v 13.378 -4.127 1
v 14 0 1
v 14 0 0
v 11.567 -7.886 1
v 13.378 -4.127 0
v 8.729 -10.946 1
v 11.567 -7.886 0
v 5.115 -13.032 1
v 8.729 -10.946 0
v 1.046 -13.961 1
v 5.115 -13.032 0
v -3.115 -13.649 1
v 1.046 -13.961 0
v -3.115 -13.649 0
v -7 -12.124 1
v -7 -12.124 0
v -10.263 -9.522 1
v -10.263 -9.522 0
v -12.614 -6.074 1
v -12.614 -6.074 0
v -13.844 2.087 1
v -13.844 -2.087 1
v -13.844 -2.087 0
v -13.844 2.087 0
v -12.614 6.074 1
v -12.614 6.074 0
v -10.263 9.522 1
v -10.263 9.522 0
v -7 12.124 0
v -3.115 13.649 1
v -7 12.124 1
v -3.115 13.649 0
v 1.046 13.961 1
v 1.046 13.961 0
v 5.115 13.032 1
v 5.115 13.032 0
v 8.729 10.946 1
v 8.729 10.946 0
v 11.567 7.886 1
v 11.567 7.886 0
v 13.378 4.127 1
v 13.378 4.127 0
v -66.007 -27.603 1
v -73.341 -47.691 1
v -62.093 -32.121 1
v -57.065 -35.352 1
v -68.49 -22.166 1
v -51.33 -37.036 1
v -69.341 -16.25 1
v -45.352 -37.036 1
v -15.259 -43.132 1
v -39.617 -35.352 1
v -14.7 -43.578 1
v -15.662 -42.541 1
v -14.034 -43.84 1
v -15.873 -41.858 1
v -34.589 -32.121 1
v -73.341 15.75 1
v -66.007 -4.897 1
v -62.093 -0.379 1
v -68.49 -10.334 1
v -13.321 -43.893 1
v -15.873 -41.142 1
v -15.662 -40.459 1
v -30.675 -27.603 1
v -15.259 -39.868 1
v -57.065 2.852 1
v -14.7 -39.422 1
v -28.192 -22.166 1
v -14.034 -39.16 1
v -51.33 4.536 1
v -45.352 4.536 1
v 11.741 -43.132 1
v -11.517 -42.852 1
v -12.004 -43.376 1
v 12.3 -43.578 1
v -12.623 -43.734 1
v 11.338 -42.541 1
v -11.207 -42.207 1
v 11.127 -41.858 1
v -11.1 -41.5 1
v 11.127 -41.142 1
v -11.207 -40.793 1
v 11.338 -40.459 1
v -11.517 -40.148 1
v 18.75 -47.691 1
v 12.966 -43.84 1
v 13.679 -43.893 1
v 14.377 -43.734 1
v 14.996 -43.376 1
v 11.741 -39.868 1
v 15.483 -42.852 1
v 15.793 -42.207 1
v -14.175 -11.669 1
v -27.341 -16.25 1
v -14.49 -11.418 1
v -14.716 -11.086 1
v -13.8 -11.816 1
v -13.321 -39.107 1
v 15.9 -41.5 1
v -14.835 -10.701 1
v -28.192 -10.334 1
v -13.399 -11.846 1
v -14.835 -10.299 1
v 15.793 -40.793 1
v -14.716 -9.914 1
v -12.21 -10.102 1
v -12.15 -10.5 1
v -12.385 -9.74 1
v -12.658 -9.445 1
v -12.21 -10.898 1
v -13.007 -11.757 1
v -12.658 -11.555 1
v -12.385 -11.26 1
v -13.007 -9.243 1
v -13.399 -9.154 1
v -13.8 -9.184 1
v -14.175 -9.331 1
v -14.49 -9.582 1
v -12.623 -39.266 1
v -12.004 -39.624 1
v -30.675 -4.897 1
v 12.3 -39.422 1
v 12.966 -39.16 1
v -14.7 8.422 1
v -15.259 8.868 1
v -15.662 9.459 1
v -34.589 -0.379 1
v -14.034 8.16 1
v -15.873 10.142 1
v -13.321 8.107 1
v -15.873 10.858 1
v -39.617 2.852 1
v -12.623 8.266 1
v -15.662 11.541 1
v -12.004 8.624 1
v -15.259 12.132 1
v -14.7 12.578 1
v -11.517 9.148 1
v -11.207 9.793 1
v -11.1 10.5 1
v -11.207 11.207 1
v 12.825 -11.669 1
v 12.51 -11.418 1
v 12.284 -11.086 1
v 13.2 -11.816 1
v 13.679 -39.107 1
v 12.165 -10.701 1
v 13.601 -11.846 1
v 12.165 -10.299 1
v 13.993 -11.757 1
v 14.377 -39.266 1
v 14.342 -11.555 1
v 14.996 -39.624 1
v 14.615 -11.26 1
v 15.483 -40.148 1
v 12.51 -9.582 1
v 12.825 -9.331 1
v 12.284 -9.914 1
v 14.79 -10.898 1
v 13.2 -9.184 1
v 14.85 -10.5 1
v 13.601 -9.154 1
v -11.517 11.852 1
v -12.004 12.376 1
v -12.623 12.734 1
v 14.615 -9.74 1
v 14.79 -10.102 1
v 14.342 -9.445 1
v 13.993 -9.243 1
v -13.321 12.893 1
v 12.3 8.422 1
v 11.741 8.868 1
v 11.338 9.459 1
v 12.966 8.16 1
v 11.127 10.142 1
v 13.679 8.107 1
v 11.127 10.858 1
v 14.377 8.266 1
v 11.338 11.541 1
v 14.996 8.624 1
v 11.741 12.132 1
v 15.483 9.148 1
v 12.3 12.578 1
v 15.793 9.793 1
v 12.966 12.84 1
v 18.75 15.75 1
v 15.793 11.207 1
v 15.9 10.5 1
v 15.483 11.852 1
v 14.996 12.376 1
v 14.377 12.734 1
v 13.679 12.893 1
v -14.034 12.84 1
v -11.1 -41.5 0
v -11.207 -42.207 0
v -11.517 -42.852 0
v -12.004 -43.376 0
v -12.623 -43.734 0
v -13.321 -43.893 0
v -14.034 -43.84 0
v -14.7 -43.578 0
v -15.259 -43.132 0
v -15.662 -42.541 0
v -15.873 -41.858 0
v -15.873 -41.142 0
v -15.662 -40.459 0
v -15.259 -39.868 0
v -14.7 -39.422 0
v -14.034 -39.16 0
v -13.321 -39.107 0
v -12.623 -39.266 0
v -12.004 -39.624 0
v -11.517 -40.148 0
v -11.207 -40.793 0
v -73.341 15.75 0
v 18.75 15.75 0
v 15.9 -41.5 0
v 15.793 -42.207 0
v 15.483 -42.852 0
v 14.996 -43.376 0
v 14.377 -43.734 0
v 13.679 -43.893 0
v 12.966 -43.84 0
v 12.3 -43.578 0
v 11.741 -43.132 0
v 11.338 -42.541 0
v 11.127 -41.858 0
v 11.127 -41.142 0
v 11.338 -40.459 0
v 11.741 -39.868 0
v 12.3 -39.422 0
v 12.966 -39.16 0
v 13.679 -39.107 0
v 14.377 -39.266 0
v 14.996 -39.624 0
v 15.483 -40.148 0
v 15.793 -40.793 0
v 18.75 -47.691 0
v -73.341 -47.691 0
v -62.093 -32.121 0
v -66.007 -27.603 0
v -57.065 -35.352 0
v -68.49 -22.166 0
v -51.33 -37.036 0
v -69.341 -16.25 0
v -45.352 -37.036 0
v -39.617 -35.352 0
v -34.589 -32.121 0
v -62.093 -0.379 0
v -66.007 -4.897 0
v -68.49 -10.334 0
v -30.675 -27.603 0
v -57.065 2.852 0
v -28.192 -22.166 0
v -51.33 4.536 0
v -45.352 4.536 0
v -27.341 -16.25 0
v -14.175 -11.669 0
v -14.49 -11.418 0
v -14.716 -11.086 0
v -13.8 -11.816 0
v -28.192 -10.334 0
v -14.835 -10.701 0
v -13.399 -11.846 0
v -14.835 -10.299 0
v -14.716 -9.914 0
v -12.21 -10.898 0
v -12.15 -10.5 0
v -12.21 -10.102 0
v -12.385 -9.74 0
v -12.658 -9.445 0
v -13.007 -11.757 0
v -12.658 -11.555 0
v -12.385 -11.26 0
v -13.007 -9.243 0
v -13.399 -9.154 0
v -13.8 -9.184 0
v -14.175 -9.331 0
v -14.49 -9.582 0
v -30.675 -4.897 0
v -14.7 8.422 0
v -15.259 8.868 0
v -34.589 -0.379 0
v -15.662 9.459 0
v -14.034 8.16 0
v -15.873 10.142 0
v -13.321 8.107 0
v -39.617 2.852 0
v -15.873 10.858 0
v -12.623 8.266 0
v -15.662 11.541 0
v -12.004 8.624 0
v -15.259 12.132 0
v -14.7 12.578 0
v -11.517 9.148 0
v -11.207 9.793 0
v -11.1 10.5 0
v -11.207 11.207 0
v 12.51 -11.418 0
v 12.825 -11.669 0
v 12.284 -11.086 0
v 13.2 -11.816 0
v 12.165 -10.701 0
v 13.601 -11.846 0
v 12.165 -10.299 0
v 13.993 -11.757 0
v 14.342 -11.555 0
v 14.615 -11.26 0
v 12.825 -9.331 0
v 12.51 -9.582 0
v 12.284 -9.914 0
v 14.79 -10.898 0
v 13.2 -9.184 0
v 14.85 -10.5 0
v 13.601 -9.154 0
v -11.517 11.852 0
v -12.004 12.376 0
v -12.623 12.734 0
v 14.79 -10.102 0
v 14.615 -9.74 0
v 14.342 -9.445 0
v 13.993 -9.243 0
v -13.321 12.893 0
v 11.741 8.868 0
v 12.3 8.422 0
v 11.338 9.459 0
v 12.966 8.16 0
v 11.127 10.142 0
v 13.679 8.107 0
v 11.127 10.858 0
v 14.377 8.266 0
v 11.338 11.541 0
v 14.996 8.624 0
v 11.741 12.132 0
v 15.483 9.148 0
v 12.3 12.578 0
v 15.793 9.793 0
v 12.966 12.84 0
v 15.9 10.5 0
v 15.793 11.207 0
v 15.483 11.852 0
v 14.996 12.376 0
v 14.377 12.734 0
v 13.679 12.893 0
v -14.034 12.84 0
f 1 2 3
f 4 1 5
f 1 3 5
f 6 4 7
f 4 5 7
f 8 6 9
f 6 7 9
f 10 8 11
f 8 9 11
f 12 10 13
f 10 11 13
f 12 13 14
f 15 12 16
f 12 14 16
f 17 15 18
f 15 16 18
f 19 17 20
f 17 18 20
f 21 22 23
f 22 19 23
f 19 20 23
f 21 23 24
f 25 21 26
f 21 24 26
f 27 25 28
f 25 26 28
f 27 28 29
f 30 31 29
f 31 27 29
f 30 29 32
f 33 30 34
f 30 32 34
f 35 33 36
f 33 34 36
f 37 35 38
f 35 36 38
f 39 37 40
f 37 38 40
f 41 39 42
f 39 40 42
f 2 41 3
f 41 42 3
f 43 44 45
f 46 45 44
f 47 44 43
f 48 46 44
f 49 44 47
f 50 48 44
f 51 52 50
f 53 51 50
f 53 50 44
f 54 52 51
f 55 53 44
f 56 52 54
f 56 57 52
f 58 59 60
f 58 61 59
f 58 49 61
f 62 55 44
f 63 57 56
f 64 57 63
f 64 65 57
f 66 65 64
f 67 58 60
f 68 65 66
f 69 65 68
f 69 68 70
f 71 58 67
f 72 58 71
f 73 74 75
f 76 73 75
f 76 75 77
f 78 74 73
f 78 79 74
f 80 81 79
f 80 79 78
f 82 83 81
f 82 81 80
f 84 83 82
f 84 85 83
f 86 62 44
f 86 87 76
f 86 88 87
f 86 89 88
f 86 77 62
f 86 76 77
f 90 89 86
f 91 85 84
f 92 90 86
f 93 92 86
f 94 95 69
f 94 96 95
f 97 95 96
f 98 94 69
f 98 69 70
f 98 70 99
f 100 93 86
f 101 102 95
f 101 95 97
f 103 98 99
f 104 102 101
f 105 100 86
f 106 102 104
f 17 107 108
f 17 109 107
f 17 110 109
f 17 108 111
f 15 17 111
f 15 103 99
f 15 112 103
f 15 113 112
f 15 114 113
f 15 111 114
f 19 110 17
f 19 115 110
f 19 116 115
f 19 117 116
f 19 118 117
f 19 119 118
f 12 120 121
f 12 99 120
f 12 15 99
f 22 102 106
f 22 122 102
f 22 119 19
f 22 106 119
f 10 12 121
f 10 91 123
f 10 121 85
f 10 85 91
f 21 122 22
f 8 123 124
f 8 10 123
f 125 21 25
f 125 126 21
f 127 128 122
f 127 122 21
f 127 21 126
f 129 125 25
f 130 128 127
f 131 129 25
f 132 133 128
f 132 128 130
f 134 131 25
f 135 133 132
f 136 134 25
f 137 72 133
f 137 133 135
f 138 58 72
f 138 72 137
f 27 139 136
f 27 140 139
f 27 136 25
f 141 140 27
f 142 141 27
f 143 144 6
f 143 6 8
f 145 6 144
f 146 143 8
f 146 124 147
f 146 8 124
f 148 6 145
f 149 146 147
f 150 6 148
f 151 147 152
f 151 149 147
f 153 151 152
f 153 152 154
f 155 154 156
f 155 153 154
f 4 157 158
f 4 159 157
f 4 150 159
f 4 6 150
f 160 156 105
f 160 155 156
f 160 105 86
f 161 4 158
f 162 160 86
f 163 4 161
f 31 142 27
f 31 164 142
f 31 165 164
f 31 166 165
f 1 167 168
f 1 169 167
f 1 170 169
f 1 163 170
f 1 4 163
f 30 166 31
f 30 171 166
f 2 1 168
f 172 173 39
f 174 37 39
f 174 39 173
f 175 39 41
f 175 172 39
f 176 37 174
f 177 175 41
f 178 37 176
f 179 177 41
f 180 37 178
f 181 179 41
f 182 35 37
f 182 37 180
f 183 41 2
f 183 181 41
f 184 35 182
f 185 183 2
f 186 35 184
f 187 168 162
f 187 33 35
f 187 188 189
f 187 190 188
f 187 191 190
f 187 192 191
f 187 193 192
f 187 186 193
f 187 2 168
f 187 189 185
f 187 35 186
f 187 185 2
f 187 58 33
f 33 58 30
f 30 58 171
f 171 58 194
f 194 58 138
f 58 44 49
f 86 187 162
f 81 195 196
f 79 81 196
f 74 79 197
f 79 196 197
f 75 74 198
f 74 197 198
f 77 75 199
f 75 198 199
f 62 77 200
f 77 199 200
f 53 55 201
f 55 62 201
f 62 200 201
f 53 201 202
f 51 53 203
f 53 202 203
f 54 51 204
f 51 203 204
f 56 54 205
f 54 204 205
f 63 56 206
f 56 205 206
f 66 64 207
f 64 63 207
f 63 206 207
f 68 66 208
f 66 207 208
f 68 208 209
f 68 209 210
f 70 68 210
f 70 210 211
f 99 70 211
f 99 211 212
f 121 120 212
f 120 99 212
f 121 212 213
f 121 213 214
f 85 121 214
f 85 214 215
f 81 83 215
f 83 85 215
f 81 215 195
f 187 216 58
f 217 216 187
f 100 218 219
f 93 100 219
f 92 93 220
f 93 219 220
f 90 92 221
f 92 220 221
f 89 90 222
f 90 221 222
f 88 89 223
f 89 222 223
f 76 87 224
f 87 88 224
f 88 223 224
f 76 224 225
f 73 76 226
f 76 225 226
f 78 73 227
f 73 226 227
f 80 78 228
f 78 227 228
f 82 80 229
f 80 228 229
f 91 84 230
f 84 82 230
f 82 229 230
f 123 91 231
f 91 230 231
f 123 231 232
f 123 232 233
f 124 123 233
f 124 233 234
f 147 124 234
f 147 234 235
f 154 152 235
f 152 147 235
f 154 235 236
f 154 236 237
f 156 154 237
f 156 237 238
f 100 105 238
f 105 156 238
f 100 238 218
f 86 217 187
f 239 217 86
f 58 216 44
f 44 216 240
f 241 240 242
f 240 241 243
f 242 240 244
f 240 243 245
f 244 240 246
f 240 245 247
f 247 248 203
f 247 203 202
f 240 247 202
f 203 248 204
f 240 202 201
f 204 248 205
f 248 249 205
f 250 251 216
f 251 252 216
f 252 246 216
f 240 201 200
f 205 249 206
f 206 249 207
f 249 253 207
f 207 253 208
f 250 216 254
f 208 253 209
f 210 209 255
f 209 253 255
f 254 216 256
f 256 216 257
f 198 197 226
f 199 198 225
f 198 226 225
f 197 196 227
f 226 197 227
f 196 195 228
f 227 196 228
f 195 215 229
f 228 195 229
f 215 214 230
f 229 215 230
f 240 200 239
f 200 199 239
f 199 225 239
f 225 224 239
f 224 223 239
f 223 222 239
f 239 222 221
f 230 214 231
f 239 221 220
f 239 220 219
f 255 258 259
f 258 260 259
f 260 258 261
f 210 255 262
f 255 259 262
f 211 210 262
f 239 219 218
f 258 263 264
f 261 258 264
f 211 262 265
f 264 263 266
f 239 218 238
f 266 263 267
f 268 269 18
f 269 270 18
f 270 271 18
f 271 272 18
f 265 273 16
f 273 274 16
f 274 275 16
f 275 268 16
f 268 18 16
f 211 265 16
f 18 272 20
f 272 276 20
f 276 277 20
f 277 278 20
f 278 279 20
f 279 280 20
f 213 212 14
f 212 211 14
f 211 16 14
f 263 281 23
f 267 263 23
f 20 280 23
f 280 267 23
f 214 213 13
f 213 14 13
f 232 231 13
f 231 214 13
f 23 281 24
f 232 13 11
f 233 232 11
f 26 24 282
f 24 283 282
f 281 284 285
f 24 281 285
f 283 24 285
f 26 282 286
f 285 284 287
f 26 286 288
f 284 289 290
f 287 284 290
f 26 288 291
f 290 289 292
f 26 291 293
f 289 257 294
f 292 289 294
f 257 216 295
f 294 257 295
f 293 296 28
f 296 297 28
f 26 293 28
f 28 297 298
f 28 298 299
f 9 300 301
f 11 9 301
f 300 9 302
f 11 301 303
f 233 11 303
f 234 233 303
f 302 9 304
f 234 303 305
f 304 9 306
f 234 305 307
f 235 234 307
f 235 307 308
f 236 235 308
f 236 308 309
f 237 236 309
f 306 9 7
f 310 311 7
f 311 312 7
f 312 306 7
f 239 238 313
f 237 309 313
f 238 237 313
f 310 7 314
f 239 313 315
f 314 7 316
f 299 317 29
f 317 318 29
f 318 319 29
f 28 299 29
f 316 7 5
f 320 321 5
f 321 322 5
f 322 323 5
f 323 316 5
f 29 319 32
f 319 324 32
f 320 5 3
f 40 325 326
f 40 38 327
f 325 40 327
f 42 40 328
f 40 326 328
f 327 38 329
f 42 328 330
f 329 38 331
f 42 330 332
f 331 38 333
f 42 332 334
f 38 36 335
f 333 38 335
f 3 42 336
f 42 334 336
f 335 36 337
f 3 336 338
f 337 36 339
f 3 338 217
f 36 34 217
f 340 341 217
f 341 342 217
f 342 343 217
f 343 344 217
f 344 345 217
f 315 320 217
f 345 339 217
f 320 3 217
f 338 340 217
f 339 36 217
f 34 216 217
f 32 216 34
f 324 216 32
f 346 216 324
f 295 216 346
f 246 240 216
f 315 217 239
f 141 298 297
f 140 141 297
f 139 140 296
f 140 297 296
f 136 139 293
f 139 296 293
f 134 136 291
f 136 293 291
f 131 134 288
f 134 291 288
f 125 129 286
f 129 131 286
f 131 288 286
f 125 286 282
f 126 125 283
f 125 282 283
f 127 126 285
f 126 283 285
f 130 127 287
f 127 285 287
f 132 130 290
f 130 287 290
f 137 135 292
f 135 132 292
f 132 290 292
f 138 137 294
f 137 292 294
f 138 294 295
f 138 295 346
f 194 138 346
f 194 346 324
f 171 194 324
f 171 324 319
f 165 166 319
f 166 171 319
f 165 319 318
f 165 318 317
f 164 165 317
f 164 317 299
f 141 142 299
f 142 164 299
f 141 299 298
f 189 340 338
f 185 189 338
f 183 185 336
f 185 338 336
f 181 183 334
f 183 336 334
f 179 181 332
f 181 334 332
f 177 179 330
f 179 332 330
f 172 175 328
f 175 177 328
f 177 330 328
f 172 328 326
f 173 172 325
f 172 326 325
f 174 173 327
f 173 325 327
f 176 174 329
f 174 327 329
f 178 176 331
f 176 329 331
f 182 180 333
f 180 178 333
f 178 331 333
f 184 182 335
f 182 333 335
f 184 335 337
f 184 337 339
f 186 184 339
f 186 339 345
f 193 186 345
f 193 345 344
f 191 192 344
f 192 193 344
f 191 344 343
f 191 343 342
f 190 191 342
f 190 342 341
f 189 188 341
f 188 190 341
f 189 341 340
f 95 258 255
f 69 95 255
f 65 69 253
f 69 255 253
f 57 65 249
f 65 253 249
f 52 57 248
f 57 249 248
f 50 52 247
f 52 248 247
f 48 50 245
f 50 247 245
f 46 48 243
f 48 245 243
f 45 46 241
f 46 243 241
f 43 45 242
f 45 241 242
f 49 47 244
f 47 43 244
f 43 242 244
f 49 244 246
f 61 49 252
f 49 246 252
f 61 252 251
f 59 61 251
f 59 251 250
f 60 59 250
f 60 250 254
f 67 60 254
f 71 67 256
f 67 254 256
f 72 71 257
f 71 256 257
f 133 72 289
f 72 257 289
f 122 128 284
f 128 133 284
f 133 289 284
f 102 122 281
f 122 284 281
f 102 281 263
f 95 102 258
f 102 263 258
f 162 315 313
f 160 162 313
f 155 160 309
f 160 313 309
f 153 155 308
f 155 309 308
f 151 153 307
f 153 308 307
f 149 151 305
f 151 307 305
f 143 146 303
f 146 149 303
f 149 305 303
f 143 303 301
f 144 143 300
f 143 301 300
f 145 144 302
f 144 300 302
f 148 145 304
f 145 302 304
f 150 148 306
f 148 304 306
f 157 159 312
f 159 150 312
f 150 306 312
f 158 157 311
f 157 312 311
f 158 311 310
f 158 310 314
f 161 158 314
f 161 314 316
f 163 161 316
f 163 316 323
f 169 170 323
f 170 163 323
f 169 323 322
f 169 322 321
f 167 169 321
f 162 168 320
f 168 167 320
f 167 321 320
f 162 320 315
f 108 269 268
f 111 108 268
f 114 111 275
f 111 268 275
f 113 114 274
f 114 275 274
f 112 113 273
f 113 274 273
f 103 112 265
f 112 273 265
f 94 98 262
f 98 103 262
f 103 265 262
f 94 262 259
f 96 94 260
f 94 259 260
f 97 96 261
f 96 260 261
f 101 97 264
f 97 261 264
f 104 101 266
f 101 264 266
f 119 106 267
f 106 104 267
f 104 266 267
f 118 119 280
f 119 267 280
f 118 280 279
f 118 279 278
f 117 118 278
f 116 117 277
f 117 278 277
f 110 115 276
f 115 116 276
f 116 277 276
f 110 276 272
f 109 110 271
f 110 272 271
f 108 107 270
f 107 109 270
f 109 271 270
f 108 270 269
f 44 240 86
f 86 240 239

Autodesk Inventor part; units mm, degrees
ref_plane "YZ Plane" through (0, 0, 0) normal (1, 0, 0) x (0, 1, 0)
ref_plane "XZ Plane" through (0, 0, 0) normal (0, 1, 0) x (-1, 0, 0)
ref_plane "XY Plane" through (0, 0, 0) normal (0, 0, 1) x (1, 0, 0)
sketch "スケッチ1" plane through (0, 0, 0) normal (0, 0, 1) x (1, 0, 0)
  line L0 (14.5843, 13.35) -> (-14.5843, 13.35) projected
  line L1 (-14.5843, 13.35) -> (-16.35, 11.5843) projected
  line L2 (-16.35, 11.5843) -> (-16.35, -42.5843) projected
  line L3 (-16.35, -42.5843) -> (-14.5843, -44.35) projected
  line L4 (-14.5843, -44.35) -> (14.5843, -44.35) projected
  line L5 (14.5843, -44.35) -> (16.35, -42.5843) projected
  line L6 (16.35, -42.5843) -> (16.35, 11.5843) projected
  line L7 (16.35, 11.5843) -> (14.5843, 13.35) projected
  circle A0 centre (-13.5, 10.5) radius 2.4 projected
  circle A1 centre (13.5, -41.5) radius 2.4 projected
  circle A2 centre (-13.5, -41.5) radius 2.4 projected
  circle A3 centre (13.5, -10.5) radius 1.35 projected
  circle A4 centre (-13.5, -10.5) radius 1.35 projected
  circle A5 centre (13.5, 10.5) radius 2.4 projected
  circle A6 centre (0, 0) radius 13 projected
  line L8 (18.75, 15.75) -> (18.75, -47.6913) projected
  line L9 (-83.25, 15.75) -> (16.75, 15.75) projected
  line L10 (-73.341, 13.75) -> (-73.341, 3.75) projected
  line L11 (18.75, 15.75) -> (-73.341, 15.75)
  line L12 (-73.341, 15.75) -> (-73.341, -47.6913)
  line L13 (-73.341, -47.6913) -> (18.75, -47.6913)
  line L14 (18.75, -47.6913) -> (18.75, 15.75)
  line L15 (-52.6233, -21.6557) -> (-51.2333, -20.6912) projected
  arc A7 (-51.2333, -20.6912) -> (-53.5136, -17.4049) centre (-48.341, -16.25) ccw projected
  line L16 (-53.5136, -17.4049) -> (-54.9036, -18.3694) projected
  arc A8 (-54.9036, -18.3694) -> (-54.9539, -18.6477) centre (-54.7896, -18.5337) ccw projected
  line L17 (-54.9539, -18.6477) -> (-52.9016, -21.6054) projected
  arc A9 (-52.9016, -21.6054) -> (-52.6233, -21.6557) centre (-52.7373, -21.4914) ccw projected
  circle A10 centre (-48.341, -16.25) radius 19.7 projected
  circle A11 centre (0, 0) radius 14
  circle A12 centre (-48.341, -16.25) radius 21
  dimension "d0" = 28
  dimension "d1" = 42
extrude "押し出し1" add sketch "スケッチ1" along normal blind 1 contours L7 L6 L5 L4 L3 L2 L1 L0 A11 | L8 L13 L12 L10 L9 L11
